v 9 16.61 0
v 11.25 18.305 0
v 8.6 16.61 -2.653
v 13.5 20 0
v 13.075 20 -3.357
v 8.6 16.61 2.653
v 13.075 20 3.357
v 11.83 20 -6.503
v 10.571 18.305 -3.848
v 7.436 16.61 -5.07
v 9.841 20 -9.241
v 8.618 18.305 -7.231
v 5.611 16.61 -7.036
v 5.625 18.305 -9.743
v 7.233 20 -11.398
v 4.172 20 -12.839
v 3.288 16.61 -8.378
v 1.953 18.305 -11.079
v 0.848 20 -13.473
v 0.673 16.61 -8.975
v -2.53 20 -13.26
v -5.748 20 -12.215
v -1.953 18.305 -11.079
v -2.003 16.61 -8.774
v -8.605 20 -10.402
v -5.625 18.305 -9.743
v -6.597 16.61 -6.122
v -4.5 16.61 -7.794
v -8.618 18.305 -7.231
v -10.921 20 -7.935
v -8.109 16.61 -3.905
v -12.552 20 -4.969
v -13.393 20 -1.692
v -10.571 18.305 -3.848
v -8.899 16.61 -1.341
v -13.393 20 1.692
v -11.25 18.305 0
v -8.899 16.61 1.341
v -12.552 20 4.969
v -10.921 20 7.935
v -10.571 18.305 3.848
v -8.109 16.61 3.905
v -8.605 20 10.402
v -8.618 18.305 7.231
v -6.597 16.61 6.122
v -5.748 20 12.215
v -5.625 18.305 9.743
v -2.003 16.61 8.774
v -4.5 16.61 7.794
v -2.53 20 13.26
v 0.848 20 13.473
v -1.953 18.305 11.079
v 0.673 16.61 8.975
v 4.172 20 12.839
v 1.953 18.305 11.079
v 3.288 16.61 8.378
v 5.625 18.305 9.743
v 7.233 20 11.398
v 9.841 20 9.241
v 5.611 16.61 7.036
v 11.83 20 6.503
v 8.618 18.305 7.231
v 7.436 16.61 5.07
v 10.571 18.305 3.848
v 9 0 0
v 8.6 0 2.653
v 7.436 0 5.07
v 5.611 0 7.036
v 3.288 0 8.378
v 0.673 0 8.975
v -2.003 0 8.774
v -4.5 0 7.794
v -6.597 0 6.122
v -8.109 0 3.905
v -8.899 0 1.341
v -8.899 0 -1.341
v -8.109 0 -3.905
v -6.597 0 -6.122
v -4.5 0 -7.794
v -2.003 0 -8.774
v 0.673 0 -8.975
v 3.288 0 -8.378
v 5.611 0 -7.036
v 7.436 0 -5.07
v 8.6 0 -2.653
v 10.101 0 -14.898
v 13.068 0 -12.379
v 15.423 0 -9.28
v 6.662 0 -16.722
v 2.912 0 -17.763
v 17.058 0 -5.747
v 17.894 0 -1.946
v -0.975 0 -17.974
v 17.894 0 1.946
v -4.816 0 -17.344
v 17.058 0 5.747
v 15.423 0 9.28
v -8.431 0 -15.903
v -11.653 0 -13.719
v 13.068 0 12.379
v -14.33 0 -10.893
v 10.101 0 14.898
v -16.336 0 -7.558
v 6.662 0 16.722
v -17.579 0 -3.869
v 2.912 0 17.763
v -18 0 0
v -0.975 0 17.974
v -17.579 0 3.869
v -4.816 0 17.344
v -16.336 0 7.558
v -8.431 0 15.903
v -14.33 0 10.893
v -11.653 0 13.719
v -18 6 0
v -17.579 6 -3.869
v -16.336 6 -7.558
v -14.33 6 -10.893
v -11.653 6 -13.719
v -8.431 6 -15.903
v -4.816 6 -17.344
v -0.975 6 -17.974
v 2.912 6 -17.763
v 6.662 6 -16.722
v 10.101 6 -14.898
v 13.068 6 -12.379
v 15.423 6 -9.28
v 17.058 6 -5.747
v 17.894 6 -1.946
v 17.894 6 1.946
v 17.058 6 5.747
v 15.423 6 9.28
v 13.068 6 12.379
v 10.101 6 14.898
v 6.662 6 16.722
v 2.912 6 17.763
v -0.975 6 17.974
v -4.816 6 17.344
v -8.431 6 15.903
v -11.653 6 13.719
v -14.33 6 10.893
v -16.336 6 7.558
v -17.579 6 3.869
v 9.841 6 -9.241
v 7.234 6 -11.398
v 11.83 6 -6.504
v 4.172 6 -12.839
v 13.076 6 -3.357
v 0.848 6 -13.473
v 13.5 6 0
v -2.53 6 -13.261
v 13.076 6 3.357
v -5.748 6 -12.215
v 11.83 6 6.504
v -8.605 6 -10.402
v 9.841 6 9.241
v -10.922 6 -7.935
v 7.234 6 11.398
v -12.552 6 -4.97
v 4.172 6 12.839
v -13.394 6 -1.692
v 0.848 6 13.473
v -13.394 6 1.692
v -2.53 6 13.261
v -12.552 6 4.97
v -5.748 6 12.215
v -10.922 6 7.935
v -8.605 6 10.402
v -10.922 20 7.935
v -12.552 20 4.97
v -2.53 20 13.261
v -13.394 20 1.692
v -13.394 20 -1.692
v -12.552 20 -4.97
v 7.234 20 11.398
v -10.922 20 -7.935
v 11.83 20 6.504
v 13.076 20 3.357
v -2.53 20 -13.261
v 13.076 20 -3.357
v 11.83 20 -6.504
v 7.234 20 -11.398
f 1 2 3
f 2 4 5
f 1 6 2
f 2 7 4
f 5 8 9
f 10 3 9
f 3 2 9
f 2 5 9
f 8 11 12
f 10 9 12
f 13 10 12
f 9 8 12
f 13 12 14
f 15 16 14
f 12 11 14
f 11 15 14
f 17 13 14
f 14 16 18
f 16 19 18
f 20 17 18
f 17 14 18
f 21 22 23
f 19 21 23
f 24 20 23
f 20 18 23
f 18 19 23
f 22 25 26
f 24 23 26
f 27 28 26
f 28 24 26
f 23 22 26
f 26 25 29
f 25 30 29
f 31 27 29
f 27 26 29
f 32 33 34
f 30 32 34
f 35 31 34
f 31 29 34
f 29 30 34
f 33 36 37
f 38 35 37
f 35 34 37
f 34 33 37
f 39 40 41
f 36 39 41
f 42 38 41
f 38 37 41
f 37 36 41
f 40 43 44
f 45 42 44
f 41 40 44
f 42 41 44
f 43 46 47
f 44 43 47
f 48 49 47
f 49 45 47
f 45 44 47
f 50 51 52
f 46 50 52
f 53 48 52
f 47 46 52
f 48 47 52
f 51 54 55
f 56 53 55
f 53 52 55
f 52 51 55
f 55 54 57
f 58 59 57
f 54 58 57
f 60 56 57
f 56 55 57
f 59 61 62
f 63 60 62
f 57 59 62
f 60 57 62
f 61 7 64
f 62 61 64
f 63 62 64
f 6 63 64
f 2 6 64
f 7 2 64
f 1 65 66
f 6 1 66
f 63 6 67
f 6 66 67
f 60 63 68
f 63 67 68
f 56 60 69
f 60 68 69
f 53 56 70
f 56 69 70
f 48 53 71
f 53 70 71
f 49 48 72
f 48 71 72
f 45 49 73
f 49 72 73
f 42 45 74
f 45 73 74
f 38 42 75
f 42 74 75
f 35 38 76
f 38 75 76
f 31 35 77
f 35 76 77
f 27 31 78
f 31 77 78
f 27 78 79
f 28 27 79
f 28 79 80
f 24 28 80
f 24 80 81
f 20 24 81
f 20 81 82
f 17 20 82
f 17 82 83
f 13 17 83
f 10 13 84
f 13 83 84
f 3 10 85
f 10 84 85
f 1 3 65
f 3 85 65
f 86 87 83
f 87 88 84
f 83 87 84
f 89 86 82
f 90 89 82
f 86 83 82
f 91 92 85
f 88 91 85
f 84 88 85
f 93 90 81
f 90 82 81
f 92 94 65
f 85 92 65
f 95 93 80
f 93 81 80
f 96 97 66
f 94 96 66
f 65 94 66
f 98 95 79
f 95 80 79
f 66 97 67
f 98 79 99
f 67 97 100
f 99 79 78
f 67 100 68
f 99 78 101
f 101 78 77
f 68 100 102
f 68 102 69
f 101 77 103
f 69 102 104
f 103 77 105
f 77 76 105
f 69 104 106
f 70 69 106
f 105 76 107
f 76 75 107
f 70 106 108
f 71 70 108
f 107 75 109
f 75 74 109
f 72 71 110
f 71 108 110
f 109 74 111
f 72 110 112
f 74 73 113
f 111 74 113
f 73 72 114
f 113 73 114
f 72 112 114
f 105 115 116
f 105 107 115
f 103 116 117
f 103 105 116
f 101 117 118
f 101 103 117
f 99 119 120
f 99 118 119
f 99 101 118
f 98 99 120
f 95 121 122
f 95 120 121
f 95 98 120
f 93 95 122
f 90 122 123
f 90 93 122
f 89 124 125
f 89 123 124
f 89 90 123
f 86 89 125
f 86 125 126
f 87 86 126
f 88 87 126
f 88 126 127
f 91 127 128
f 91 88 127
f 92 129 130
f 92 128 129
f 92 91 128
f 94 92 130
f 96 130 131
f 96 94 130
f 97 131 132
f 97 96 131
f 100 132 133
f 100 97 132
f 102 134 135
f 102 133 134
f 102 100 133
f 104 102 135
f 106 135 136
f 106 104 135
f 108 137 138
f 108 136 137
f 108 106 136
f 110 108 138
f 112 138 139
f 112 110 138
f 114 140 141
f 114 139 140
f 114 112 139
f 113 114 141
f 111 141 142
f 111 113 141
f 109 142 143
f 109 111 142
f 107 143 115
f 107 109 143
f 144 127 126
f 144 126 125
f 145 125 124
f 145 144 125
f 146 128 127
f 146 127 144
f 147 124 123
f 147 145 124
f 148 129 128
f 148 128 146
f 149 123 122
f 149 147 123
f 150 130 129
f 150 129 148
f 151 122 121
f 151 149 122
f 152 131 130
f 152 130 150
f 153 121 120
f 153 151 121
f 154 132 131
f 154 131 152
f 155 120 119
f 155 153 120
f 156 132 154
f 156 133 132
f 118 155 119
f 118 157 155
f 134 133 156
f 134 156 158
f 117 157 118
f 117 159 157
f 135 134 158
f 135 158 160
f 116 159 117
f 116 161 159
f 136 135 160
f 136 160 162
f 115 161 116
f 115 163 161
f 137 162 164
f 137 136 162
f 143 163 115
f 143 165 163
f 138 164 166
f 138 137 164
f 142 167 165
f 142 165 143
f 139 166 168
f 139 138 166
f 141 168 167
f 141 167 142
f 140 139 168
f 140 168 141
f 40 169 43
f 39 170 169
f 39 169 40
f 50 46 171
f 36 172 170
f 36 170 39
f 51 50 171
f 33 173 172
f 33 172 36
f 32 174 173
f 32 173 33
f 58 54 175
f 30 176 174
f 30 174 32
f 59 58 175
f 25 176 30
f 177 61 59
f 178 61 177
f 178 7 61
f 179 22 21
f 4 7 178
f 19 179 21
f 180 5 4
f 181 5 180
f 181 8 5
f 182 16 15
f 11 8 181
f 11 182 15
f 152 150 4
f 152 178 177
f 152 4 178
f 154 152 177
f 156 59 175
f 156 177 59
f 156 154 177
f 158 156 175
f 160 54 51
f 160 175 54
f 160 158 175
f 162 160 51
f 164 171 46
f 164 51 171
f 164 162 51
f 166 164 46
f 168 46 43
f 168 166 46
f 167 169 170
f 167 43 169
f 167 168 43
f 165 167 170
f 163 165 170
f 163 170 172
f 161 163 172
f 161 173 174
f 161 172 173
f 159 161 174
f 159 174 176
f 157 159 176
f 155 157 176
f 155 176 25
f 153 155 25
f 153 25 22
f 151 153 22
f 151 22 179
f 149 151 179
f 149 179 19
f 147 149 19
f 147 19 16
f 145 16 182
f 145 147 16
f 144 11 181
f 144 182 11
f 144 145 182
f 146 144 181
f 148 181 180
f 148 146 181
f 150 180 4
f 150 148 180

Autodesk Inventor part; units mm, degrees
ref_plane "YZ Plane" through (0, 0, 0) normal (1, 0, 0) x (0, 1, 0)
ref_plane "XZ Plane" through (0, 0, 0) normal (0, 1, 0) x (-1, 0, 0)
ref_plane "XY Plane" through (0, 0, 0) normal (0, 0, 1) x (1, 0, 0)
sketch "Sketch6" plane through (0, 0, 0) normal (0, 1, 0) x (-1, 0, 0)
  circle A0 centre (0, 0) radius 18
  dimension "d30" = 36
extrude "Extrusion4" add sketch "Sketch6" along normal blind 6
sketch "Sketch7" plane through (0, 6, 0) normal (0, 1, 0) x (1, 0, 0)
  circle A0 centre (0, 0) radius 13.5
  dimension "d33" = 27
extrude "Extrusion5" add sketch "Sketch7" along normal blind 14
sketch "Sketch8" plane through (0, 0, 0) normal (0, -1, 0) x (1, 0, 0)
  circle A0 centre (0, 0) radius 9
  dimension "d36" = 18
extrude "Extrusion6" cut sketch "Sketch8" against normal through all
chamfer "Chamfer2" distance 4.5 angle 37 1 edges at (-9, 20, 0) measured on face at (11.7821, 20, 1.7949)
properties part number "00.32.008 \"Bushing\"" material "Steel"
